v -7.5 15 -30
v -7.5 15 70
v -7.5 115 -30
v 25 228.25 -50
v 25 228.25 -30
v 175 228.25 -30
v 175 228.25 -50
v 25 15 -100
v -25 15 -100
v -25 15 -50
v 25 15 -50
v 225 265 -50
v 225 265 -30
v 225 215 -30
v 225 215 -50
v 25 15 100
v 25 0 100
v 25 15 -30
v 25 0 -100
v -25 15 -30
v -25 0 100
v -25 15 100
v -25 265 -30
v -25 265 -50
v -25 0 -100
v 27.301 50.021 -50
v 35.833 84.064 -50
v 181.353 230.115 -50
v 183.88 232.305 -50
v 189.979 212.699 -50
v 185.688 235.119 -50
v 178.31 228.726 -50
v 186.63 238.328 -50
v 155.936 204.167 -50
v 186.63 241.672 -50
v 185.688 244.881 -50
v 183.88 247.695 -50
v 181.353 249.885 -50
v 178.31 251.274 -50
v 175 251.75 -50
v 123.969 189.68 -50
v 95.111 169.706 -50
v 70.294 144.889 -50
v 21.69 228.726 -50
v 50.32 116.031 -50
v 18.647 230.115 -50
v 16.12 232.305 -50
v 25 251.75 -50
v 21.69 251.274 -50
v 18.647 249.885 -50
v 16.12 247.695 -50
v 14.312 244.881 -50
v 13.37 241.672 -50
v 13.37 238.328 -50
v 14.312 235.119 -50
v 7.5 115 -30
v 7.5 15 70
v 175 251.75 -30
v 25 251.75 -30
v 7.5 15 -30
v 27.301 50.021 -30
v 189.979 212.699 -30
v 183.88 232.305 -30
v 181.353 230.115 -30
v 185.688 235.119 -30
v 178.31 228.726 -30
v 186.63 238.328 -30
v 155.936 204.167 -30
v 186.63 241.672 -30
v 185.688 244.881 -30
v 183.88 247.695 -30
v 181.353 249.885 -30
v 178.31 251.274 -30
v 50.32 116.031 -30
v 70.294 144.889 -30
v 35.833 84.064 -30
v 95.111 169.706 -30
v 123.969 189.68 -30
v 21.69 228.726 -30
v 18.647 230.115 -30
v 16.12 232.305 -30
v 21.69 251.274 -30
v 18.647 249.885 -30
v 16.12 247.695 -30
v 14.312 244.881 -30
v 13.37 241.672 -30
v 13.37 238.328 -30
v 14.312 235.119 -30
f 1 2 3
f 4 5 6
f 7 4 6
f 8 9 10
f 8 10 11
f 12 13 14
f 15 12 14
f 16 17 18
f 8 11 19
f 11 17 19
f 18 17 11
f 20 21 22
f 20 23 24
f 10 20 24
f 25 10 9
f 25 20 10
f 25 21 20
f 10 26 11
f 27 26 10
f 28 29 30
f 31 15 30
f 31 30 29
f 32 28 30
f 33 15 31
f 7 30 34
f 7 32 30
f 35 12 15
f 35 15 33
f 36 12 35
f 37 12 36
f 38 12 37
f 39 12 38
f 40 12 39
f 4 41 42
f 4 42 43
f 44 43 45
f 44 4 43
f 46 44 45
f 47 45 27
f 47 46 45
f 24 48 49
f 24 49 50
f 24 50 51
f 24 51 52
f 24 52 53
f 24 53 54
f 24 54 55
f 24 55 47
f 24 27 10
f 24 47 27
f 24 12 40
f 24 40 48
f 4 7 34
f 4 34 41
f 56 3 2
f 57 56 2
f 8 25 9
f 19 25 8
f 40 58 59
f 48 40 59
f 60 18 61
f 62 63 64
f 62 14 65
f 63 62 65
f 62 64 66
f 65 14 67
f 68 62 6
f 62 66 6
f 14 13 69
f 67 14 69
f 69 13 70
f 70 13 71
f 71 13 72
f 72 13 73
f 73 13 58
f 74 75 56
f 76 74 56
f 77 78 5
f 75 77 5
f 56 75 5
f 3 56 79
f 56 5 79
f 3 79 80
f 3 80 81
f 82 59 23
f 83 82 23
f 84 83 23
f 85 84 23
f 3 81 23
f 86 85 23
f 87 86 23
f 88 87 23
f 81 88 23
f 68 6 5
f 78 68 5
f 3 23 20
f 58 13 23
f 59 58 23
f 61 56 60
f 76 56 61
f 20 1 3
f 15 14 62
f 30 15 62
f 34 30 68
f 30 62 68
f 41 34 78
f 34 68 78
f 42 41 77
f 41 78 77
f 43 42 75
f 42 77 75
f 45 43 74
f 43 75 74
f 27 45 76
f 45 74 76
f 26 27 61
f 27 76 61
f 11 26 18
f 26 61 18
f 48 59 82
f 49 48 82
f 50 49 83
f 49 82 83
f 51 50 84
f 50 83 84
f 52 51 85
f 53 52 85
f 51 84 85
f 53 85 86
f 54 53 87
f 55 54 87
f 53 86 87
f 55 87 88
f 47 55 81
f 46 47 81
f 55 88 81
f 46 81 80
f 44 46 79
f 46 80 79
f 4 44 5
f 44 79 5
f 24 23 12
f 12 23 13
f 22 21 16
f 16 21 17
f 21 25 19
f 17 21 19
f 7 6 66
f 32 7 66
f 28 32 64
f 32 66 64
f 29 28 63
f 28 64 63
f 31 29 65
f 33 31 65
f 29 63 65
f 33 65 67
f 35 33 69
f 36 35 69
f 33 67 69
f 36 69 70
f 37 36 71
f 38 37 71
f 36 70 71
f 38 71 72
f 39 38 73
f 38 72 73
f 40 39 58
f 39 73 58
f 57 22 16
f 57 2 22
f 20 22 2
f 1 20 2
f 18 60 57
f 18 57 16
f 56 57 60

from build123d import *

# Parameters (mm, degrees)
SKETCH1_W           = 50
SKETCH1_H           = 200
BOSS_EXTRUDE1_DEPTH = 15
BOSS_EXTRUDE2_DEPTH = 20
BOSS_EXTRUDE3_DEPTH = 15


with BuildPart() as part:
    # Sketch1 → Boss-Extrude1 (new body)
    with BuildSketch(Plane(origin=(0, 0, 0), x_dir=(1, 0, 0), z_dir=(0, 1, 0))):
        Rectangle(SKETCH1_W, SKETCH1_H)
    extrude(amount=BOSS_EXTRUDE1_DEPTH)

    # Sketch2 → Boss-Extrude2 (add)
    with BuildSketch(Plane(origin=(0, 0, -30), x_dir=(-1, 0, 0), z_dir=(0, 0, -1))):
        with BuildLine():
            Line((25, 15), (25, 265))
            Line((25, 265), (-225, 265))
            Line((-225, 265), (-225, 215))
            ThreePointArc((-225, 215), (-82.144079422, 157.855920578), (-25, 15))
            Line((-25, 15), (25, 15))
        make_face()
        with BuildLine():
            Line((-25, 228.25), (-175, 228.25))
            ThreePointArc((-175, 228.25), (-186.75, 240), (-175, 251.75))
            Line((-175, 251.75), (-25, 251.75))
            ThreePointArc((-25, 251.75), (-13.25, 240), (-25, 228.25))
        make_face(mode=Mode.SUBTRACT)
    extrude(amount=BOSS_EXTRUDE2_DEPTH)

    # Sketch4 → Boss-Extrude3 (add)
    with BuildSketch(Plane.ZY.offset(7.5)):
        Polygon((-30, 115), (70, 15), (-30, 15), align=None)
    extrude(amount=-BOSS_EXTRUDE3_DEPTH)


solid = part.part
